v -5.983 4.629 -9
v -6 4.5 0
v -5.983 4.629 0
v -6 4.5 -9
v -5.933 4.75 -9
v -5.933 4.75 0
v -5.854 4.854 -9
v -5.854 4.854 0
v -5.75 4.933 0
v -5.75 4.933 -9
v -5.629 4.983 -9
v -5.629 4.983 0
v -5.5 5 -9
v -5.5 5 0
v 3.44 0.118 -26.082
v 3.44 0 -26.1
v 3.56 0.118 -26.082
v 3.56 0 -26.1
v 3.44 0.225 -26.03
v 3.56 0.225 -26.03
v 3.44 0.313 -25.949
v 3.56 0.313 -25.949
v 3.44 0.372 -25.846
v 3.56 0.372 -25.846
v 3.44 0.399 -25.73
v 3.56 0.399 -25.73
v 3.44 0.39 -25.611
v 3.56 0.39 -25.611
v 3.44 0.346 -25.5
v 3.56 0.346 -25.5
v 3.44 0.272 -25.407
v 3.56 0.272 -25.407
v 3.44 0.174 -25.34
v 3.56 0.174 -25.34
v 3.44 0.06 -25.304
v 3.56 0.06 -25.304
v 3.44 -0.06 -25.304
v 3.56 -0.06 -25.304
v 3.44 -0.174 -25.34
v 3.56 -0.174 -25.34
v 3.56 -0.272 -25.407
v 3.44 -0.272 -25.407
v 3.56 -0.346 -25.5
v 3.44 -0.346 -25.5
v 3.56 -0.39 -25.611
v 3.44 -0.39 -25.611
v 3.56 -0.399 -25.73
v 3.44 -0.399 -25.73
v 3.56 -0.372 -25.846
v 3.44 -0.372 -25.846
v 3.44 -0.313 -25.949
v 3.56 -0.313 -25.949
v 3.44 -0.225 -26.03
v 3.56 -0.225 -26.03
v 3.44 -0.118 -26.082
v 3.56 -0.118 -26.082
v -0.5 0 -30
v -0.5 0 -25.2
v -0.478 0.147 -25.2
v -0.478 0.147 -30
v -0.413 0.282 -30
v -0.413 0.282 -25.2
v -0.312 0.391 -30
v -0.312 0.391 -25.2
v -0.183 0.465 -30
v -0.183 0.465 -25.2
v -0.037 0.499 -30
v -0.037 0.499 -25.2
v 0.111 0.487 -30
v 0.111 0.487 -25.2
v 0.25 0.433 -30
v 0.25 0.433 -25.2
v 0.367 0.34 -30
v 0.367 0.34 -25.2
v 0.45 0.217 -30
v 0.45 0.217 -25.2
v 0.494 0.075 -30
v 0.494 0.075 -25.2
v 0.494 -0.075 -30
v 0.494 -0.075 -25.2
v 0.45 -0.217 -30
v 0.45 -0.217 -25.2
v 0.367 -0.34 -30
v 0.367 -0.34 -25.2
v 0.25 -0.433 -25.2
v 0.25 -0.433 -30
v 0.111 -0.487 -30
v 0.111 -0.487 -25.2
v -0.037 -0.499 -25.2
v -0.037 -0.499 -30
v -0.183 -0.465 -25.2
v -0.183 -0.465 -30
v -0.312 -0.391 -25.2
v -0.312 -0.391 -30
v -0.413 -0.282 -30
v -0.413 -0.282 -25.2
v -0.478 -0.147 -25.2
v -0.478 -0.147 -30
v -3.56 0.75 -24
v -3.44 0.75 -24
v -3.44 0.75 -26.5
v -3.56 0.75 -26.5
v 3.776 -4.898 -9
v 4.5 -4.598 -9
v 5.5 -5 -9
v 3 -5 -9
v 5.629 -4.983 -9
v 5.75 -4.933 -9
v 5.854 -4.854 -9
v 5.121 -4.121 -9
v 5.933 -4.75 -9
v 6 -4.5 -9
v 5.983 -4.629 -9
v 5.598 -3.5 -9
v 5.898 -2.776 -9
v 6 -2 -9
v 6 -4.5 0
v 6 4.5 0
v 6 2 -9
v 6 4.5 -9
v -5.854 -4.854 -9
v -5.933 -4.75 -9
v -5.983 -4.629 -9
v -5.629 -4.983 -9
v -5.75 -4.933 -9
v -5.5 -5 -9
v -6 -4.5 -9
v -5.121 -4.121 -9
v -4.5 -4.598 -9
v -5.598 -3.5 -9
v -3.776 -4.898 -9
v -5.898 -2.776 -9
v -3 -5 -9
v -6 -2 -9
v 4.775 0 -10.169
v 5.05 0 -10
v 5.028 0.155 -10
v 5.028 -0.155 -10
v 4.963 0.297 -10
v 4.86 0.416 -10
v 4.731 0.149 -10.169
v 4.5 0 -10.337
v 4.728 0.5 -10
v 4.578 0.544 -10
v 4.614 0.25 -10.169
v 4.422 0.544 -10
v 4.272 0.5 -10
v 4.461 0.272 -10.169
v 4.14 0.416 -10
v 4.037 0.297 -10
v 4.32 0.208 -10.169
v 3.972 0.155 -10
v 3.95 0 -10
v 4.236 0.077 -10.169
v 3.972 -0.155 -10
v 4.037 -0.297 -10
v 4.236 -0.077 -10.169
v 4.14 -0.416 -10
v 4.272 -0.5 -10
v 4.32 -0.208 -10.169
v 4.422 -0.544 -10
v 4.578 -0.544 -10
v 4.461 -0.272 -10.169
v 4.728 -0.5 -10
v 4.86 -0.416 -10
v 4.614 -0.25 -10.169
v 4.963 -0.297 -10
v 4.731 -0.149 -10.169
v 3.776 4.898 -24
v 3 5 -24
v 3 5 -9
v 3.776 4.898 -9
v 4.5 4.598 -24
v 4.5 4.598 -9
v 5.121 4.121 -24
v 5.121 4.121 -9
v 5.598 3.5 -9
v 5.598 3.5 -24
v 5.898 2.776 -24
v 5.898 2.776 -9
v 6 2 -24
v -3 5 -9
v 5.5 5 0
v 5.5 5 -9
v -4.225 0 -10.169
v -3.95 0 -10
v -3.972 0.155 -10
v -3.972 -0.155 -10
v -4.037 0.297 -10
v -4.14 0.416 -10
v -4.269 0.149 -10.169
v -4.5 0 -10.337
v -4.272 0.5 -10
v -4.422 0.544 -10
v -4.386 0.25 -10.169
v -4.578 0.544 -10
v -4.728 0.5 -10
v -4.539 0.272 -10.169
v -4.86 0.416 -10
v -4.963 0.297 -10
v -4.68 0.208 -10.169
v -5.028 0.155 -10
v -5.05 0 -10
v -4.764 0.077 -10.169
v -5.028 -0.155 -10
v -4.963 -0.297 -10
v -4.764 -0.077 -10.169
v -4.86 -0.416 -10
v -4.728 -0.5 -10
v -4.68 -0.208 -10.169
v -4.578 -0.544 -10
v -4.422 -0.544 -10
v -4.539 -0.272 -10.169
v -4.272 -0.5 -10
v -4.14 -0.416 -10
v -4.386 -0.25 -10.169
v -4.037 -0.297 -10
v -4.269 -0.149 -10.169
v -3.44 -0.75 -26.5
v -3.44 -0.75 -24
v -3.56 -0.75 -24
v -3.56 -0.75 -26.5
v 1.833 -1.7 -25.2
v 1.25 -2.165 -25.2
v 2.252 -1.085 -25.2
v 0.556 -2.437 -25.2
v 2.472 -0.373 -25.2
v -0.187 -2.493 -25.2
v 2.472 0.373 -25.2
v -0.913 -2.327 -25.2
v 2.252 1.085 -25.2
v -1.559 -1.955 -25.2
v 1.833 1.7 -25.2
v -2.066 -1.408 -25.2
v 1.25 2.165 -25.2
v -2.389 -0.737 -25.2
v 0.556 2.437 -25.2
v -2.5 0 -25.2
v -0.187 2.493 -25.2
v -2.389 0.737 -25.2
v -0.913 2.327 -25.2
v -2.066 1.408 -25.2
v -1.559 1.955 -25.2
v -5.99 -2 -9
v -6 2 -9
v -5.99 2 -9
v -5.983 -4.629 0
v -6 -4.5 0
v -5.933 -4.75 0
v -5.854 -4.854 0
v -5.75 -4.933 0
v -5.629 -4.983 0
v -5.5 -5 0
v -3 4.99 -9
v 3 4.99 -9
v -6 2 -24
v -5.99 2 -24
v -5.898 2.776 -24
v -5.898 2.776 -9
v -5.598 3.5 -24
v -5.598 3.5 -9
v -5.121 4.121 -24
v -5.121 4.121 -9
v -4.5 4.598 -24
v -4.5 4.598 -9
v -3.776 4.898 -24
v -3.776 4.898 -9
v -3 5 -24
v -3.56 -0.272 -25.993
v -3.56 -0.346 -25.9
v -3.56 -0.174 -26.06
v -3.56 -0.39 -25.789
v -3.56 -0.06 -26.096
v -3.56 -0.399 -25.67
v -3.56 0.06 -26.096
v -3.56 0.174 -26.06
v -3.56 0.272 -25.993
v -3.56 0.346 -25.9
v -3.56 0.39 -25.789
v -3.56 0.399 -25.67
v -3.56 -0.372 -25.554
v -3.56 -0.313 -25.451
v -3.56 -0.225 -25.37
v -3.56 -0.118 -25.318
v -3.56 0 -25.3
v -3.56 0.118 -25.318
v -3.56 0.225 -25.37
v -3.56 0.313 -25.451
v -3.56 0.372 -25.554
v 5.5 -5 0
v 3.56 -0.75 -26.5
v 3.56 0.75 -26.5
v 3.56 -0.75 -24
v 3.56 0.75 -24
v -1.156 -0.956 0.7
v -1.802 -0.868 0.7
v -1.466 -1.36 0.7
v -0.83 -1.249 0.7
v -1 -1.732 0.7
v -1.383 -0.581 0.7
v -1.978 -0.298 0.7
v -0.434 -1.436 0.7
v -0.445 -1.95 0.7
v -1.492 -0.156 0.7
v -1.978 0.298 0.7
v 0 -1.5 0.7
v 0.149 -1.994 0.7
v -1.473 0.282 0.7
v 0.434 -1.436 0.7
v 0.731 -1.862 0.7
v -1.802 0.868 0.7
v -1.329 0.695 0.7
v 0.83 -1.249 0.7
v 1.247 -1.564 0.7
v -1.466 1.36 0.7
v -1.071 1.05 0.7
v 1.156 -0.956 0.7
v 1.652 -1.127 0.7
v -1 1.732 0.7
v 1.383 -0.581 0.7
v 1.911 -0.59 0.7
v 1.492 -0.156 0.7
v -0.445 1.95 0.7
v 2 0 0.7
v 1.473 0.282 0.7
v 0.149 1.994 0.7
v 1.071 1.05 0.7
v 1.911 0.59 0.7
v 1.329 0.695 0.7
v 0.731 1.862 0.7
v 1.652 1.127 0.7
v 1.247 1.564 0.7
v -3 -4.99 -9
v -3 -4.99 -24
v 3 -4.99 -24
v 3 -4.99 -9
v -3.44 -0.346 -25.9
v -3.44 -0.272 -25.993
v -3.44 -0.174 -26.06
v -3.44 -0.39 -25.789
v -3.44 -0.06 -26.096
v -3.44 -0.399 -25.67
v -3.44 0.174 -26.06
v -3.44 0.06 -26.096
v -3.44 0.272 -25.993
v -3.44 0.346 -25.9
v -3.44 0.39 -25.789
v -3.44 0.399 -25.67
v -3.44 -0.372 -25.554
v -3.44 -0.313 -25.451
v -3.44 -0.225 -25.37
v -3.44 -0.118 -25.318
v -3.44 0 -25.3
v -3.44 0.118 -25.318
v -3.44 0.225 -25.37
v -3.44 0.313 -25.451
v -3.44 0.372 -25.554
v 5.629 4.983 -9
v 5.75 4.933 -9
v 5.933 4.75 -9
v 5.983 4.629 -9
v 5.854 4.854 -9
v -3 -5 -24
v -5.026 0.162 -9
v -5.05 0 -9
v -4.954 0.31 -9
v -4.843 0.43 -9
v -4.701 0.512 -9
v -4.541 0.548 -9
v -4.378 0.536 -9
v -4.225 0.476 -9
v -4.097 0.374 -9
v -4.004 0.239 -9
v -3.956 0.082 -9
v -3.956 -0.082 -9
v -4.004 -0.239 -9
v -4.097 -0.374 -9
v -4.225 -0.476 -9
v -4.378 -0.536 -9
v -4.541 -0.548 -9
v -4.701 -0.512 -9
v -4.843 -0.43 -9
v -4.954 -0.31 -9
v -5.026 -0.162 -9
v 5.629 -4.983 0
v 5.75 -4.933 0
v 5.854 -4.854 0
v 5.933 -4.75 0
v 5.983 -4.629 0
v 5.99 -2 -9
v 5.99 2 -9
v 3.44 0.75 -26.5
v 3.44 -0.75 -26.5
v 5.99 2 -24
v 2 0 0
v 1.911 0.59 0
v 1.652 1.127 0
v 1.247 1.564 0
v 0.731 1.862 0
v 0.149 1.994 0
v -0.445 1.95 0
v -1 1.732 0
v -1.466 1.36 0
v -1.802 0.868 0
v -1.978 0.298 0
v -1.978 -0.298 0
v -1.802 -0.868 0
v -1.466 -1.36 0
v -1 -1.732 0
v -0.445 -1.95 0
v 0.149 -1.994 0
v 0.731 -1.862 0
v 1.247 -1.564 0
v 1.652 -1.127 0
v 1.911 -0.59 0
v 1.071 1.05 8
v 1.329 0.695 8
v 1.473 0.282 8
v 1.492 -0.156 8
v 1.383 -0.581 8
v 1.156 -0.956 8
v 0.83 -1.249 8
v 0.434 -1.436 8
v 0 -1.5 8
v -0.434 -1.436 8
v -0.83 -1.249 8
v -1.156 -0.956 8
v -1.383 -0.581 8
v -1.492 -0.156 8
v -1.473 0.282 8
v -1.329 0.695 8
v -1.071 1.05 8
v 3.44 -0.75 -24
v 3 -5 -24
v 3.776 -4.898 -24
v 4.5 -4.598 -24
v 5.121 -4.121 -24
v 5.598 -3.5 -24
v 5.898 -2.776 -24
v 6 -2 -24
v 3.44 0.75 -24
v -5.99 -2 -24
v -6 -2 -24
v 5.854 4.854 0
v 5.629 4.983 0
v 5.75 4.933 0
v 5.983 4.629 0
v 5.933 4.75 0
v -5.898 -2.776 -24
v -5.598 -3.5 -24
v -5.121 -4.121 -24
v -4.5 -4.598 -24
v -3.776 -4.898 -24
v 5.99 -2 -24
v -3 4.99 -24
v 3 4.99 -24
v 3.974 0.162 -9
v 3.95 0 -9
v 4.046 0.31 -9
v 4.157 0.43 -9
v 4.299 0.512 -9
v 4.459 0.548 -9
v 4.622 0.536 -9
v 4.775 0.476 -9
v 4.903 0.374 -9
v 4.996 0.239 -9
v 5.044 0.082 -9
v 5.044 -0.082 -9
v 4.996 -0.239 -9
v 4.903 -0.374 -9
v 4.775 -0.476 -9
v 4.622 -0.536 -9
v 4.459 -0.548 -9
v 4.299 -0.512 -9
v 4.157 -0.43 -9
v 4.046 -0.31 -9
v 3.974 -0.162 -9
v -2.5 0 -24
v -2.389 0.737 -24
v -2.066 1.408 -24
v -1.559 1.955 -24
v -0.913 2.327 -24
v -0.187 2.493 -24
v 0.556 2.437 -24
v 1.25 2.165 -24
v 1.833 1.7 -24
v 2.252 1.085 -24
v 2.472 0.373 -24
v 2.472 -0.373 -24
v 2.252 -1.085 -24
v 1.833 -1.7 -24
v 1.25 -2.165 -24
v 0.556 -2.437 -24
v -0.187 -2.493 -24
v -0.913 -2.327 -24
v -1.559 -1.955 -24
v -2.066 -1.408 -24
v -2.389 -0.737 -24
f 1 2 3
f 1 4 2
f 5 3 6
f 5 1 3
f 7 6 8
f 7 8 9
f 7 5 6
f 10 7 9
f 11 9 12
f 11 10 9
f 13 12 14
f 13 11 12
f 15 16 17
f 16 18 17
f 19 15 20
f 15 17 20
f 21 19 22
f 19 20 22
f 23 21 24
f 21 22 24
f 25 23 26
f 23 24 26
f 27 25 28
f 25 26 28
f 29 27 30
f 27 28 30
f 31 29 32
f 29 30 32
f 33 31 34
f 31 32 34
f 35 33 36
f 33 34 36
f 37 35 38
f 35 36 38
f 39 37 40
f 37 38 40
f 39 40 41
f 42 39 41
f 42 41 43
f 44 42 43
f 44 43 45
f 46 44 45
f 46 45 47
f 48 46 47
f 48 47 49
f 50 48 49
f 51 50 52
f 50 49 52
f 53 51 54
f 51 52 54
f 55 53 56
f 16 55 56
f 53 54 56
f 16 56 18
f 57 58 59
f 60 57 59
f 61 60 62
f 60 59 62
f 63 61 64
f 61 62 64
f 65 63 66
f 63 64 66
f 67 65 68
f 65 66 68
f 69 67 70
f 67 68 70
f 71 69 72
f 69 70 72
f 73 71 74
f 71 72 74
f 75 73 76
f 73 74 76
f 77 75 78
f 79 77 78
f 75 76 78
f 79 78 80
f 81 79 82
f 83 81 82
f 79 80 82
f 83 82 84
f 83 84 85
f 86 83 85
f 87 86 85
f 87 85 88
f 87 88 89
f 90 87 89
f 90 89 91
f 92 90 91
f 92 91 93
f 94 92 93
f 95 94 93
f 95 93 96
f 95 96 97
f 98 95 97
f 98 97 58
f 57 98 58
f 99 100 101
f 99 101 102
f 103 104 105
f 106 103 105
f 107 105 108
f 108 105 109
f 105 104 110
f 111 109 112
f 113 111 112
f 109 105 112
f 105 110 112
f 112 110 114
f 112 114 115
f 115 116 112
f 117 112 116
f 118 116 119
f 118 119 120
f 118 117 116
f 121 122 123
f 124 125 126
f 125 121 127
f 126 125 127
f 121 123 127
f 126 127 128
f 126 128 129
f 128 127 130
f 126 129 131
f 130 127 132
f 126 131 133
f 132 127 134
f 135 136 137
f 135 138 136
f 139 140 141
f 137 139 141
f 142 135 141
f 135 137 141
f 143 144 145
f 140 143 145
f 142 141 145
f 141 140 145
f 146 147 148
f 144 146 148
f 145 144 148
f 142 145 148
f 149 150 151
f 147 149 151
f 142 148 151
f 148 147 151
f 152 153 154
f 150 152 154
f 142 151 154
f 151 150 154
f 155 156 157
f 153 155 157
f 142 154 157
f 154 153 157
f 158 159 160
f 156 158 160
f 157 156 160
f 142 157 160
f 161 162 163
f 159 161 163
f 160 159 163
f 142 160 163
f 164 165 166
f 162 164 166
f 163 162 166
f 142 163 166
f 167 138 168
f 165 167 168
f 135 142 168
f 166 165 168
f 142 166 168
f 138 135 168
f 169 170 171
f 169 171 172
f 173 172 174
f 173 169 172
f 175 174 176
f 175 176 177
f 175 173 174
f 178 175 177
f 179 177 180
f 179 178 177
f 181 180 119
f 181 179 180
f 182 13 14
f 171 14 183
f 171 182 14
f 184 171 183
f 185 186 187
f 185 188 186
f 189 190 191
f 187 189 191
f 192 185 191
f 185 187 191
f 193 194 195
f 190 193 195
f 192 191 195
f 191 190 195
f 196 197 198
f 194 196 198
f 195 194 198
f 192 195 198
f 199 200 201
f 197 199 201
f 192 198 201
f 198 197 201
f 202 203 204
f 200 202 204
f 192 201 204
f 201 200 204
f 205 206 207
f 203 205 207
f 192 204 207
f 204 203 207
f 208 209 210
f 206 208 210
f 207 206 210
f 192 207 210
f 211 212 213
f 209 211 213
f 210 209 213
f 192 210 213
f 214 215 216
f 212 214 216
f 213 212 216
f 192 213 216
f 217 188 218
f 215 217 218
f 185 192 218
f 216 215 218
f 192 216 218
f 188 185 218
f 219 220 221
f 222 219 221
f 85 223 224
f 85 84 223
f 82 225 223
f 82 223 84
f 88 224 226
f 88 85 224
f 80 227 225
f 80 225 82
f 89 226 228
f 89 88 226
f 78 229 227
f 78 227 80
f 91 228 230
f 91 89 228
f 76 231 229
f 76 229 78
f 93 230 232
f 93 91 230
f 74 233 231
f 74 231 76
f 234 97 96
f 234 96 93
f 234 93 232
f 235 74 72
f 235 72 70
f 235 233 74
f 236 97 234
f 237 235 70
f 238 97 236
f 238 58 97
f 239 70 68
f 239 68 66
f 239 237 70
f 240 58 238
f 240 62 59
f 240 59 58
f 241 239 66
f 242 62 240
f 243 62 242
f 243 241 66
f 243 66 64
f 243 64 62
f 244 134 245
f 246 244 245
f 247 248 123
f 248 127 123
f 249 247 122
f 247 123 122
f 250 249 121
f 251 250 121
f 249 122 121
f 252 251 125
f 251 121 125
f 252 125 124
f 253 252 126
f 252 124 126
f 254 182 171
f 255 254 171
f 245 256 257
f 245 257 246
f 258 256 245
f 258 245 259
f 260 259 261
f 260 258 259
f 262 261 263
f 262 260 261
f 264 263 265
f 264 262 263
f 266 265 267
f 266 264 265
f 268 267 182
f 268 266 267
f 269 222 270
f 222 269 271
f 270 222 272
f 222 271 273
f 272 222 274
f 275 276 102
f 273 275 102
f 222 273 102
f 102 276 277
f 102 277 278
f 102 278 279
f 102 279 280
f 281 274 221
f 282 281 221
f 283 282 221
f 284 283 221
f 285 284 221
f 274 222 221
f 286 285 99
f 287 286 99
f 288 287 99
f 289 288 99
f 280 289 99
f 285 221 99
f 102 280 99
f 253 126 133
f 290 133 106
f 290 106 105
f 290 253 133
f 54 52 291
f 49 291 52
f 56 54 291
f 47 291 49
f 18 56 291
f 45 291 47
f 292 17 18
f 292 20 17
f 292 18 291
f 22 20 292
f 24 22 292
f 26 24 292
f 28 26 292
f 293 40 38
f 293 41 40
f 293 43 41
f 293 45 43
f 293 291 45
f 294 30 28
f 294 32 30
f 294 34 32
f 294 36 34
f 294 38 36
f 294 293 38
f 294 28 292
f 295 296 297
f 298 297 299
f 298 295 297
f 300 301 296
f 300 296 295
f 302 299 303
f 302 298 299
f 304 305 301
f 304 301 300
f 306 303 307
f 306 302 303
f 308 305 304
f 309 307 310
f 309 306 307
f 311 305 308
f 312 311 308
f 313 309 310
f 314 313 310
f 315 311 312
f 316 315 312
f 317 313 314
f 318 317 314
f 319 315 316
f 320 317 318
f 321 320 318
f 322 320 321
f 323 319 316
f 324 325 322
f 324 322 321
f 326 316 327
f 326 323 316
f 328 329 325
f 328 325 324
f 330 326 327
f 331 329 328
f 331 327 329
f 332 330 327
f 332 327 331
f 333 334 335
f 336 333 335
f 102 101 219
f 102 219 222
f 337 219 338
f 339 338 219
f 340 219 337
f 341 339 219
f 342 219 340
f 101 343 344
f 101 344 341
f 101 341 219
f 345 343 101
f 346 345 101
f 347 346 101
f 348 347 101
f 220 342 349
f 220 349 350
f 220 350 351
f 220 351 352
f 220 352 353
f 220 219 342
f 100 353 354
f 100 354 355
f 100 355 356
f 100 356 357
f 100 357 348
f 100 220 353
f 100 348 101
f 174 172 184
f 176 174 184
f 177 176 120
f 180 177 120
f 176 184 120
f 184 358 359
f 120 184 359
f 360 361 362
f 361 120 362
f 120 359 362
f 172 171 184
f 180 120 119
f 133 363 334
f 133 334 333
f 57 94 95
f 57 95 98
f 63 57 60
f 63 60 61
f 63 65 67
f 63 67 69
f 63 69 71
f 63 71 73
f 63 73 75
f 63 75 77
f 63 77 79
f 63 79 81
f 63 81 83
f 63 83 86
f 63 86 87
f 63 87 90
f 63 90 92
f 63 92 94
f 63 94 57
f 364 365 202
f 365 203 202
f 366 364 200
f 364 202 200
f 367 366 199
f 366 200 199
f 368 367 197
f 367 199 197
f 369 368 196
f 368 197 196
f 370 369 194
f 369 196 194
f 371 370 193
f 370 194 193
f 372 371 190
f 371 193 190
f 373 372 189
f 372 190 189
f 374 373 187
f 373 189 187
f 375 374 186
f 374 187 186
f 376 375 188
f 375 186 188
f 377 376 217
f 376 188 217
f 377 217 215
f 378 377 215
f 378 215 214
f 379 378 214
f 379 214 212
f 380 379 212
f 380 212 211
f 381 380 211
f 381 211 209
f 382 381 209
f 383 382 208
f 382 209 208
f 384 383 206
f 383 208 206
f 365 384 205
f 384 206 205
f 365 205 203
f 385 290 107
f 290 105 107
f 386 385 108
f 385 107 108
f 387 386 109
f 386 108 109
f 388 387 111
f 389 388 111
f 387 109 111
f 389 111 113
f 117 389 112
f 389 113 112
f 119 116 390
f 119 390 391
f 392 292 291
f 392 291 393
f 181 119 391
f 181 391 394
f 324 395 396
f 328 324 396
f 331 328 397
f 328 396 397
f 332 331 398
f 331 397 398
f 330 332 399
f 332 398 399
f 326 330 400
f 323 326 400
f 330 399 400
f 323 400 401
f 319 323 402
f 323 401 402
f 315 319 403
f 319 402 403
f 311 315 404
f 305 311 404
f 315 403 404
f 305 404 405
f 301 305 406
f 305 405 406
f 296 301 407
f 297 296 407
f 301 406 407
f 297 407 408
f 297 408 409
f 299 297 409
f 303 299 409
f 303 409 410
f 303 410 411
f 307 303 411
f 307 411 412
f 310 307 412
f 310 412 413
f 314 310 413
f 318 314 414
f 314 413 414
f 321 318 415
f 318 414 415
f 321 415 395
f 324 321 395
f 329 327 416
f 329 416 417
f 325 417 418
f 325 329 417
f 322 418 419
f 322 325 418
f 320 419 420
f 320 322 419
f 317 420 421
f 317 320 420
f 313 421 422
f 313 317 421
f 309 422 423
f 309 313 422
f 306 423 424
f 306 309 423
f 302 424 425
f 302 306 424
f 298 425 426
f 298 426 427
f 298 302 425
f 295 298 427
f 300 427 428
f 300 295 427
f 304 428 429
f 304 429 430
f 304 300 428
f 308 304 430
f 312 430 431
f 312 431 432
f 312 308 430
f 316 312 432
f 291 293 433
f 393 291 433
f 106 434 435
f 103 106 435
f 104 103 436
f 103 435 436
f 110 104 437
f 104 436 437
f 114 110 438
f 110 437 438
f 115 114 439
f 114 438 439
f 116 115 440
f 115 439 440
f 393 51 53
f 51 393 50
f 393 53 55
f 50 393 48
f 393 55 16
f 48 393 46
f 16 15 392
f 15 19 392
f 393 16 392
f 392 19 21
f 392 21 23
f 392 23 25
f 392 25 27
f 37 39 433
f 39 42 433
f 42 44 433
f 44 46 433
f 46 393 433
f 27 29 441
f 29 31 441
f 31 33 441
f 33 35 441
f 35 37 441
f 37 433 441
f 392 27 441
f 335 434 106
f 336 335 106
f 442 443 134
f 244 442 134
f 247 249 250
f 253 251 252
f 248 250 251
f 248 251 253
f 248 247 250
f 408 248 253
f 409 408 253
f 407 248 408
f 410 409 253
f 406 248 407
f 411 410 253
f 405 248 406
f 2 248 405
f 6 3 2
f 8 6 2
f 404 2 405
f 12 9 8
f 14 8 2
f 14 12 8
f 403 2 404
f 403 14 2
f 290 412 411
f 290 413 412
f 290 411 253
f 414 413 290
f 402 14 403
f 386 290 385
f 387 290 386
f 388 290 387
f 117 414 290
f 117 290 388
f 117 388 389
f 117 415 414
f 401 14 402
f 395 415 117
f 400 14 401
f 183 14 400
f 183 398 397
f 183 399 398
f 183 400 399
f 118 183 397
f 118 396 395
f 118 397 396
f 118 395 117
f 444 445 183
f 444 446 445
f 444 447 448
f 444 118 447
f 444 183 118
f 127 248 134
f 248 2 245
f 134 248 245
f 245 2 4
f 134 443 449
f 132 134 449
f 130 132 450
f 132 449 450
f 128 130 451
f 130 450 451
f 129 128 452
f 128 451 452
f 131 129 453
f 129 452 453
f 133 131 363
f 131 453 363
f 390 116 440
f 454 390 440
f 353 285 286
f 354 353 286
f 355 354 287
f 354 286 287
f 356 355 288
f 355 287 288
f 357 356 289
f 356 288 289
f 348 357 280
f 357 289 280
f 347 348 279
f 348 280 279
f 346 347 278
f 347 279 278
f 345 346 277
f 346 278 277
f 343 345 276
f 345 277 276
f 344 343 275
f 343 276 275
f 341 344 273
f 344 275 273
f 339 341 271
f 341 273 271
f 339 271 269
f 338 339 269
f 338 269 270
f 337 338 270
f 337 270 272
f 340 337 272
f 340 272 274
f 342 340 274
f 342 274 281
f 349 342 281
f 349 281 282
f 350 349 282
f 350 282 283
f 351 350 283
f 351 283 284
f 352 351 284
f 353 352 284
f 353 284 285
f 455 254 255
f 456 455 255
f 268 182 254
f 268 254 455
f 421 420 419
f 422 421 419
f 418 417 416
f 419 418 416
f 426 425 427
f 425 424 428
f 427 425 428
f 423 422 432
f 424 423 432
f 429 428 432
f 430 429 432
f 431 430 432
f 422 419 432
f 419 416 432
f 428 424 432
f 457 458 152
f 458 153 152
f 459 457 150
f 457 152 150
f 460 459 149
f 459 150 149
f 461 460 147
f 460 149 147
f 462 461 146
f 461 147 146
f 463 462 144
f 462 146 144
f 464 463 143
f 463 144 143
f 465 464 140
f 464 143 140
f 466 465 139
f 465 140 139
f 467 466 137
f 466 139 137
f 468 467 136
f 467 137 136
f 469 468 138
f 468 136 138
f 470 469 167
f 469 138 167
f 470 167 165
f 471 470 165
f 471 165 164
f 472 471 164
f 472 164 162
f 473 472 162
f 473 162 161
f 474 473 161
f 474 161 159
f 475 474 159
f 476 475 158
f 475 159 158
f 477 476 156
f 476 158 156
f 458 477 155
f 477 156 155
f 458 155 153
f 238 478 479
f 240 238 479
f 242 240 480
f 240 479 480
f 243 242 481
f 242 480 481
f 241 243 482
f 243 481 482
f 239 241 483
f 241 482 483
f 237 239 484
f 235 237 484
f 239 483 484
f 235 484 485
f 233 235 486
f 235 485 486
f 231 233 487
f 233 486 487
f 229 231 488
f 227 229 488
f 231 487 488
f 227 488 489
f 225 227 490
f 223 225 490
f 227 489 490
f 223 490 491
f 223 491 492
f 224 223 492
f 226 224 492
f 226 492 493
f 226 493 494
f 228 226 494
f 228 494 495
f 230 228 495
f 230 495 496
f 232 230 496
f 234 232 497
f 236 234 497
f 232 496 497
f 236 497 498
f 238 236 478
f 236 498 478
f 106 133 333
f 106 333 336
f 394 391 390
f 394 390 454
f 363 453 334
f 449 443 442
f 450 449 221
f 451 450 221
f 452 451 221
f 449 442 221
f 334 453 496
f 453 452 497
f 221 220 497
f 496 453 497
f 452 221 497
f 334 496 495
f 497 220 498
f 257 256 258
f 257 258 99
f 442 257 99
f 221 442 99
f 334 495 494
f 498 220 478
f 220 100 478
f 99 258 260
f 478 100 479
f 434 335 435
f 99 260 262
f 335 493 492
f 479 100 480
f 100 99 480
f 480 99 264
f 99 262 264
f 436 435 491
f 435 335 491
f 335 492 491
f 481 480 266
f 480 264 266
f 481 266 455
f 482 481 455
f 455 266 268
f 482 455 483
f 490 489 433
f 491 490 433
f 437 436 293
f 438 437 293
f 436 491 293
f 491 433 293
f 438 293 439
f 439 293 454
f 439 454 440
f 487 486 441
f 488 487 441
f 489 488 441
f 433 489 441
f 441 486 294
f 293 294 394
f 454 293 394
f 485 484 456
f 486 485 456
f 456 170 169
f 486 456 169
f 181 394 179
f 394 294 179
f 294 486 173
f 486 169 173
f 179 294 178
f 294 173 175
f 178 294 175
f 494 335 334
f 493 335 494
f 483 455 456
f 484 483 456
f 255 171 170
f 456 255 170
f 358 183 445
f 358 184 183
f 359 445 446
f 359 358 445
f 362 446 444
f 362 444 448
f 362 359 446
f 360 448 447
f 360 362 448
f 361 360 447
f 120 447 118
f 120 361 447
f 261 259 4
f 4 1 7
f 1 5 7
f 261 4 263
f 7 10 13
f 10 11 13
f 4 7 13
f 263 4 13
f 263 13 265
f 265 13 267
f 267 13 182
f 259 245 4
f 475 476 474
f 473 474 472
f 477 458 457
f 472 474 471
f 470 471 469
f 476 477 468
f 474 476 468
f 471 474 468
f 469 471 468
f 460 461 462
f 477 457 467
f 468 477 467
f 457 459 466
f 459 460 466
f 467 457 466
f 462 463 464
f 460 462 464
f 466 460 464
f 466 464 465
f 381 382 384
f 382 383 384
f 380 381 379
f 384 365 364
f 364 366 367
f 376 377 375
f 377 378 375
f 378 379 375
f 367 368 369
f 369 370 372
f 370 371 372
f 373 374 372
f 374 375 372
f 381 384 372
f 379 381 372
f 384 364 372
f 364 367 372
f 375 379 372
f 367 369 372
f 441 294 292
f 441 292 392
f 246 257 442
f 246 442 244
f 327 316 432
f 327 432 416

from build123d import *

# Parameters (mm, degrees)
TOP_W                                     = 12
TOP_H                                     = 10
PRECISION_MICRODRIVES_MODEL_212_109_DEPTH = 24
TOP_RING_2_R                              = 2
TOP_RING_DEPTH                            = 0.7
HOLE_WIZARD_M1_1_D                        = 1.1
HOLE_WIZARD_M1_1_DEPTH                    = 10
HOLE_WIZARD_M1_1_TIP                      = 0.337040433
HOLE_WIZARD_M1_2_D                        = 1.1
HOLE_WIZARD_M1_2_DEPTH                    = 10
HOLE_WIZARD_M1_2_TIP                      = 0.337040433
D_SHAFT_DEPTH                             = 8
VERRUNDUNG1_R                             = 3
SKIZZE12_R                                = 2.5
BOTTOM_DEPTH                              = 1.2
SKIZZE13_R                                = 0.5
BOLT_DEPTH                                = 6
SKIZZE14_W                                = 0.12
SKIZZE14_H                                = 1.5
FLAPS_DEPTH                               = 2.5
FLAP1_CUT_REACH                           = 33.881
SKIZZE15_R                                = 0.4
FLAP2_CUT_REACH                           = 33.881
SKIZZE16_R                                = 0.4
SKIZZE21_W                                = 12
SKIZZE21_H                                = 9
AUFSATZ_LINEAR_AUSTRAGEN2_DEPTH           = 10
SKIZZE22_W                                = 6
SKIZZE22_H                                = 15
SCHNITT_LINEAR_AUSTRAGEN3_DEPTH           = 0.01
SKIZZE23_W                                = 15
SKIZZE23_H                                = 4
SCHNITT_LINEAR_AUSTRAGEN4_DEPTH           = 0.01
SKIZZE24_W                                = 6
SKIZZE24_H                                = 15
SCHNITT_LINEAR_AUSTRAGEN5_DEPTH           = 0.01
SKIZZE25_W                                = 15
SKIZZE25_H                                = 4
SCHNITT_LINEAR_AUSTRAGEN6_DEPTH           = 0.01
VERRUNDUNG2_R                             = 0.5


with BuildPart() as part:
    # top → Precision Microdrives Model 212-109 (new body)
    with BuildSketch(Plane.XY):
        Rectangle(TOP_W, TOP_H)
    extrude(amount=-PRECISION_MICRODRIVES_MODEL_212_109_DEPTH)

    # top ring 2 → top-ring (add)
    with BuildSketch(Plane.XY):
        Circle(TOP_RING_2_R)
    extrude(amount=TOP_RING_DEPTH)

    # Hole Wizard M1-1
    with Locations(Plane.XY):
        with Locations((-4.5, 0)):
            Hole(HOLE_WIZARD_M1_1_D / 2, depth=HOLE_WIZARD_M1_1_DEPTH)
            with Locations((0, 0, -(HOLE_WIZARD_M1_1_DEPTH + HOLE_WIZARD_M1_1_TIP / 2))):  # 117° drill point
                Cone(0, HOLE_WIZARD_M1_1_D / 2, HOLE_WIZARD_M1_1_TIP, mode=Mode.SUBTRACT)

    # Hole Wizard M1-2
    with Locations(Plane.XY):
        with Locations((4.5, 0)):
            Hole(HOLE_WIZARD_M1_2_D / 2, depth=HOLE_WIZARD_M1_2_DEPTH)
            with Locations((0, 0, -(HOLE_WIZARD_M1_2_DEPTH + HOLE_WIZARD_M1_2_TIP / 2))):  # 117° drill point
                Cone(0, HOLE_WIZARD_M1_2_D / 2, HOLE_WIZARD_M1_2_TIP, mode=Mode.SUBTRACT)

    # Skizze11 → D-Shaft (add)
    with BuildSketch(Plane.XY):
        with BuildLine():
            Line((-1.071214264, 1.05), (1.071214264, 1.05))
            ThreePointArc((1.071214264, 1.05), (0, -1.5), (-1.071214264, 1.05))
        make_face()
    extrude(amount=D_SHAFT_DEPTH)

    # Verrundung1
    verrundung1_edges = [part.edges().sort_by_distance(p)[0] for p in [
        (-6, 5, -12),
        (6, 5, -12),
        (6, -5, -12),
        (-6, -5, -12),
    ]]
    fillet(verrundung1_edges, radius=VERRUNDUNG1_R)

    # Skizze12 → bottom (add)
    with BuildSketch(Plane(origin=(0, 0, -24), x_dir=(-1, 0, 0), z_dir=(0, 0, -1))):
        Circle(SKIZZE12_R)
    extrude(amount=BOTTOM_DEPTH)

    # Skizze13 → bolt (add)
    with BuildSketch(Plane(origin=(0, 0, -24), x_dir=(-1, 0, 0), z_dir=(0, 0, -1))):
        Circle(SKIZZE13_R)
    extrude(amount=BOLT_DEPTH)

    # Skizze14 → flaps (add)
    with BuildSketch(Plane(origin=(0, 0, -24), x_dir=(-1, 0, 0), z_dir=(0, 0, -1))):
        with Locations((-3.5, 0)):
            Rectangle(SKIZZE14_W, SKIZZE14_H)
        with Locations((3.5, 0)):
            Rectangle(SKIZZE14_W, SKIZZE14_H)
    extrude(amount=FLAPS_DEPTH)

    # Skizze15 → flap1-cut (cut, up to next)
    with BuildSketch(Plane.ZY.offset(3.56), mode=Mode.PRIVATE) as flap1_cut_sk1:
        with Locations((-25.7, 0)):
            Circle(SKIZZE15_R)
    flap1_cut_tool1 = extrude(flap1_cut_sk1.sketch, amount=-FLAP1_CUT_REACH, mode=Mode.PRIVATE) & part.part
    add(flap1_cut_tool1.solids().sort_by_distance((-3.56, 0, -25.7))[0], mode=Mode.SUBTRACT)

    # Skizze16 → flap2-cut (cut, up to next)
    with BuildSketch(Plane(origin=(3.56, 0, 0), x_dir=(0, 0, -1), z_dir=(1, 0, 0)), mode=Mode.PRIVATE) as flap2_cut_sk1:
        with Locations((25.7, 0)):
            Circle(SKIZZE16_R)
    flap2_cut_tool1 = extrude(flap2_cut_sk1.sketch, amount=-FLAP2_CUT_REACH, mode=Mode.PRIVATE) & part.part
    add(flap2_cut_tool1.solids().sort_by_distance((3.56, 0, -25.7))[0], mode=Mode.SUBTRACT)

    # Skizze21 → Aufsatz-Linear austragen2 (add)
    with BuildSketch(Plane(origin=(0, 5, 0), x_dir=(1, 0, 0), z_dir=(0, 1, 0))):
        with Locations((0, 4.5)):
            Rectangle(SKIZZE21_W, SKIZZE21_H)
    extrude(amount=-AUFSATZ_LINEAR_AUSTRAGEN2_DEPTH)

    # Skizze22 → Schnitt-Linear austragen3 (cut)
    with BuildSketch(Plane.XZ.offset(5)):
        with Locations((0, -16.5)):
            Rectangle(SKIZZE22_W, SKIZZE22_H)
    extrude(amount=-SCHNITT_LINEAR_AUSTRAGEN3_DEPTH, mode=Mode.SUBTRACT)

    # Skizze23 → Schnitt-Linear austragen4 (cut)
    with BuildSketch(Plane(origin=(6, 0, 0), x_dir=(0, 0, -1), z_dir=(1, 0, 0))):
        with Locations((16.5, 0)):
            Rectangle(SKIZZE23_W, SKIZZE23_H)
    extrude(amount=-SCHNITT_LINEAR_AUSTRAGEN4_DEPTH, mode=Mode.SUBTRACT)

    # Skizze24 → Schnitt-Linear austragen5 (cut)
    with BuildSketch(Plane(origin=(0, 5, 0), x_dir=(1, 0, 0), z_dir=(0, 1, 0))):
        with Locations((0, 16.5)):
            Rectangle(SKIZZE24_W, SKIZZE24_H)
    extrude(amount=-SCHNITT_LINEAR_AUSTRAGEN5_DEPTH, mode=Mode.SUBTRACT)

    # Skizze25 → Schnitt-Linear austragen6 (cut)
    with BuildSketch(Plane.ZY.offset(6)):
        with Locations((-16.5, 0)):
            Rectangle(SKIZZE25_W, SKIZZE25_H)
    extrude(amount=-SCHNITT_LINEAR_AUSTRAGEN6_DEPTH, mode=Mode.SUBTRACT)

    # Verrundung2
    verrundung2_edges = [part.edges().sort_by_distance(p)[0] for p in [
        (-6, -5, -4.5),
        (6, -5, -4.5),
        (6, 5, -4.5),
        (-6, 5, -4.5),
    ]]
    fillet(verrundung2_edges, radius=VERRUNDUNG2_R)


solid = part.part
